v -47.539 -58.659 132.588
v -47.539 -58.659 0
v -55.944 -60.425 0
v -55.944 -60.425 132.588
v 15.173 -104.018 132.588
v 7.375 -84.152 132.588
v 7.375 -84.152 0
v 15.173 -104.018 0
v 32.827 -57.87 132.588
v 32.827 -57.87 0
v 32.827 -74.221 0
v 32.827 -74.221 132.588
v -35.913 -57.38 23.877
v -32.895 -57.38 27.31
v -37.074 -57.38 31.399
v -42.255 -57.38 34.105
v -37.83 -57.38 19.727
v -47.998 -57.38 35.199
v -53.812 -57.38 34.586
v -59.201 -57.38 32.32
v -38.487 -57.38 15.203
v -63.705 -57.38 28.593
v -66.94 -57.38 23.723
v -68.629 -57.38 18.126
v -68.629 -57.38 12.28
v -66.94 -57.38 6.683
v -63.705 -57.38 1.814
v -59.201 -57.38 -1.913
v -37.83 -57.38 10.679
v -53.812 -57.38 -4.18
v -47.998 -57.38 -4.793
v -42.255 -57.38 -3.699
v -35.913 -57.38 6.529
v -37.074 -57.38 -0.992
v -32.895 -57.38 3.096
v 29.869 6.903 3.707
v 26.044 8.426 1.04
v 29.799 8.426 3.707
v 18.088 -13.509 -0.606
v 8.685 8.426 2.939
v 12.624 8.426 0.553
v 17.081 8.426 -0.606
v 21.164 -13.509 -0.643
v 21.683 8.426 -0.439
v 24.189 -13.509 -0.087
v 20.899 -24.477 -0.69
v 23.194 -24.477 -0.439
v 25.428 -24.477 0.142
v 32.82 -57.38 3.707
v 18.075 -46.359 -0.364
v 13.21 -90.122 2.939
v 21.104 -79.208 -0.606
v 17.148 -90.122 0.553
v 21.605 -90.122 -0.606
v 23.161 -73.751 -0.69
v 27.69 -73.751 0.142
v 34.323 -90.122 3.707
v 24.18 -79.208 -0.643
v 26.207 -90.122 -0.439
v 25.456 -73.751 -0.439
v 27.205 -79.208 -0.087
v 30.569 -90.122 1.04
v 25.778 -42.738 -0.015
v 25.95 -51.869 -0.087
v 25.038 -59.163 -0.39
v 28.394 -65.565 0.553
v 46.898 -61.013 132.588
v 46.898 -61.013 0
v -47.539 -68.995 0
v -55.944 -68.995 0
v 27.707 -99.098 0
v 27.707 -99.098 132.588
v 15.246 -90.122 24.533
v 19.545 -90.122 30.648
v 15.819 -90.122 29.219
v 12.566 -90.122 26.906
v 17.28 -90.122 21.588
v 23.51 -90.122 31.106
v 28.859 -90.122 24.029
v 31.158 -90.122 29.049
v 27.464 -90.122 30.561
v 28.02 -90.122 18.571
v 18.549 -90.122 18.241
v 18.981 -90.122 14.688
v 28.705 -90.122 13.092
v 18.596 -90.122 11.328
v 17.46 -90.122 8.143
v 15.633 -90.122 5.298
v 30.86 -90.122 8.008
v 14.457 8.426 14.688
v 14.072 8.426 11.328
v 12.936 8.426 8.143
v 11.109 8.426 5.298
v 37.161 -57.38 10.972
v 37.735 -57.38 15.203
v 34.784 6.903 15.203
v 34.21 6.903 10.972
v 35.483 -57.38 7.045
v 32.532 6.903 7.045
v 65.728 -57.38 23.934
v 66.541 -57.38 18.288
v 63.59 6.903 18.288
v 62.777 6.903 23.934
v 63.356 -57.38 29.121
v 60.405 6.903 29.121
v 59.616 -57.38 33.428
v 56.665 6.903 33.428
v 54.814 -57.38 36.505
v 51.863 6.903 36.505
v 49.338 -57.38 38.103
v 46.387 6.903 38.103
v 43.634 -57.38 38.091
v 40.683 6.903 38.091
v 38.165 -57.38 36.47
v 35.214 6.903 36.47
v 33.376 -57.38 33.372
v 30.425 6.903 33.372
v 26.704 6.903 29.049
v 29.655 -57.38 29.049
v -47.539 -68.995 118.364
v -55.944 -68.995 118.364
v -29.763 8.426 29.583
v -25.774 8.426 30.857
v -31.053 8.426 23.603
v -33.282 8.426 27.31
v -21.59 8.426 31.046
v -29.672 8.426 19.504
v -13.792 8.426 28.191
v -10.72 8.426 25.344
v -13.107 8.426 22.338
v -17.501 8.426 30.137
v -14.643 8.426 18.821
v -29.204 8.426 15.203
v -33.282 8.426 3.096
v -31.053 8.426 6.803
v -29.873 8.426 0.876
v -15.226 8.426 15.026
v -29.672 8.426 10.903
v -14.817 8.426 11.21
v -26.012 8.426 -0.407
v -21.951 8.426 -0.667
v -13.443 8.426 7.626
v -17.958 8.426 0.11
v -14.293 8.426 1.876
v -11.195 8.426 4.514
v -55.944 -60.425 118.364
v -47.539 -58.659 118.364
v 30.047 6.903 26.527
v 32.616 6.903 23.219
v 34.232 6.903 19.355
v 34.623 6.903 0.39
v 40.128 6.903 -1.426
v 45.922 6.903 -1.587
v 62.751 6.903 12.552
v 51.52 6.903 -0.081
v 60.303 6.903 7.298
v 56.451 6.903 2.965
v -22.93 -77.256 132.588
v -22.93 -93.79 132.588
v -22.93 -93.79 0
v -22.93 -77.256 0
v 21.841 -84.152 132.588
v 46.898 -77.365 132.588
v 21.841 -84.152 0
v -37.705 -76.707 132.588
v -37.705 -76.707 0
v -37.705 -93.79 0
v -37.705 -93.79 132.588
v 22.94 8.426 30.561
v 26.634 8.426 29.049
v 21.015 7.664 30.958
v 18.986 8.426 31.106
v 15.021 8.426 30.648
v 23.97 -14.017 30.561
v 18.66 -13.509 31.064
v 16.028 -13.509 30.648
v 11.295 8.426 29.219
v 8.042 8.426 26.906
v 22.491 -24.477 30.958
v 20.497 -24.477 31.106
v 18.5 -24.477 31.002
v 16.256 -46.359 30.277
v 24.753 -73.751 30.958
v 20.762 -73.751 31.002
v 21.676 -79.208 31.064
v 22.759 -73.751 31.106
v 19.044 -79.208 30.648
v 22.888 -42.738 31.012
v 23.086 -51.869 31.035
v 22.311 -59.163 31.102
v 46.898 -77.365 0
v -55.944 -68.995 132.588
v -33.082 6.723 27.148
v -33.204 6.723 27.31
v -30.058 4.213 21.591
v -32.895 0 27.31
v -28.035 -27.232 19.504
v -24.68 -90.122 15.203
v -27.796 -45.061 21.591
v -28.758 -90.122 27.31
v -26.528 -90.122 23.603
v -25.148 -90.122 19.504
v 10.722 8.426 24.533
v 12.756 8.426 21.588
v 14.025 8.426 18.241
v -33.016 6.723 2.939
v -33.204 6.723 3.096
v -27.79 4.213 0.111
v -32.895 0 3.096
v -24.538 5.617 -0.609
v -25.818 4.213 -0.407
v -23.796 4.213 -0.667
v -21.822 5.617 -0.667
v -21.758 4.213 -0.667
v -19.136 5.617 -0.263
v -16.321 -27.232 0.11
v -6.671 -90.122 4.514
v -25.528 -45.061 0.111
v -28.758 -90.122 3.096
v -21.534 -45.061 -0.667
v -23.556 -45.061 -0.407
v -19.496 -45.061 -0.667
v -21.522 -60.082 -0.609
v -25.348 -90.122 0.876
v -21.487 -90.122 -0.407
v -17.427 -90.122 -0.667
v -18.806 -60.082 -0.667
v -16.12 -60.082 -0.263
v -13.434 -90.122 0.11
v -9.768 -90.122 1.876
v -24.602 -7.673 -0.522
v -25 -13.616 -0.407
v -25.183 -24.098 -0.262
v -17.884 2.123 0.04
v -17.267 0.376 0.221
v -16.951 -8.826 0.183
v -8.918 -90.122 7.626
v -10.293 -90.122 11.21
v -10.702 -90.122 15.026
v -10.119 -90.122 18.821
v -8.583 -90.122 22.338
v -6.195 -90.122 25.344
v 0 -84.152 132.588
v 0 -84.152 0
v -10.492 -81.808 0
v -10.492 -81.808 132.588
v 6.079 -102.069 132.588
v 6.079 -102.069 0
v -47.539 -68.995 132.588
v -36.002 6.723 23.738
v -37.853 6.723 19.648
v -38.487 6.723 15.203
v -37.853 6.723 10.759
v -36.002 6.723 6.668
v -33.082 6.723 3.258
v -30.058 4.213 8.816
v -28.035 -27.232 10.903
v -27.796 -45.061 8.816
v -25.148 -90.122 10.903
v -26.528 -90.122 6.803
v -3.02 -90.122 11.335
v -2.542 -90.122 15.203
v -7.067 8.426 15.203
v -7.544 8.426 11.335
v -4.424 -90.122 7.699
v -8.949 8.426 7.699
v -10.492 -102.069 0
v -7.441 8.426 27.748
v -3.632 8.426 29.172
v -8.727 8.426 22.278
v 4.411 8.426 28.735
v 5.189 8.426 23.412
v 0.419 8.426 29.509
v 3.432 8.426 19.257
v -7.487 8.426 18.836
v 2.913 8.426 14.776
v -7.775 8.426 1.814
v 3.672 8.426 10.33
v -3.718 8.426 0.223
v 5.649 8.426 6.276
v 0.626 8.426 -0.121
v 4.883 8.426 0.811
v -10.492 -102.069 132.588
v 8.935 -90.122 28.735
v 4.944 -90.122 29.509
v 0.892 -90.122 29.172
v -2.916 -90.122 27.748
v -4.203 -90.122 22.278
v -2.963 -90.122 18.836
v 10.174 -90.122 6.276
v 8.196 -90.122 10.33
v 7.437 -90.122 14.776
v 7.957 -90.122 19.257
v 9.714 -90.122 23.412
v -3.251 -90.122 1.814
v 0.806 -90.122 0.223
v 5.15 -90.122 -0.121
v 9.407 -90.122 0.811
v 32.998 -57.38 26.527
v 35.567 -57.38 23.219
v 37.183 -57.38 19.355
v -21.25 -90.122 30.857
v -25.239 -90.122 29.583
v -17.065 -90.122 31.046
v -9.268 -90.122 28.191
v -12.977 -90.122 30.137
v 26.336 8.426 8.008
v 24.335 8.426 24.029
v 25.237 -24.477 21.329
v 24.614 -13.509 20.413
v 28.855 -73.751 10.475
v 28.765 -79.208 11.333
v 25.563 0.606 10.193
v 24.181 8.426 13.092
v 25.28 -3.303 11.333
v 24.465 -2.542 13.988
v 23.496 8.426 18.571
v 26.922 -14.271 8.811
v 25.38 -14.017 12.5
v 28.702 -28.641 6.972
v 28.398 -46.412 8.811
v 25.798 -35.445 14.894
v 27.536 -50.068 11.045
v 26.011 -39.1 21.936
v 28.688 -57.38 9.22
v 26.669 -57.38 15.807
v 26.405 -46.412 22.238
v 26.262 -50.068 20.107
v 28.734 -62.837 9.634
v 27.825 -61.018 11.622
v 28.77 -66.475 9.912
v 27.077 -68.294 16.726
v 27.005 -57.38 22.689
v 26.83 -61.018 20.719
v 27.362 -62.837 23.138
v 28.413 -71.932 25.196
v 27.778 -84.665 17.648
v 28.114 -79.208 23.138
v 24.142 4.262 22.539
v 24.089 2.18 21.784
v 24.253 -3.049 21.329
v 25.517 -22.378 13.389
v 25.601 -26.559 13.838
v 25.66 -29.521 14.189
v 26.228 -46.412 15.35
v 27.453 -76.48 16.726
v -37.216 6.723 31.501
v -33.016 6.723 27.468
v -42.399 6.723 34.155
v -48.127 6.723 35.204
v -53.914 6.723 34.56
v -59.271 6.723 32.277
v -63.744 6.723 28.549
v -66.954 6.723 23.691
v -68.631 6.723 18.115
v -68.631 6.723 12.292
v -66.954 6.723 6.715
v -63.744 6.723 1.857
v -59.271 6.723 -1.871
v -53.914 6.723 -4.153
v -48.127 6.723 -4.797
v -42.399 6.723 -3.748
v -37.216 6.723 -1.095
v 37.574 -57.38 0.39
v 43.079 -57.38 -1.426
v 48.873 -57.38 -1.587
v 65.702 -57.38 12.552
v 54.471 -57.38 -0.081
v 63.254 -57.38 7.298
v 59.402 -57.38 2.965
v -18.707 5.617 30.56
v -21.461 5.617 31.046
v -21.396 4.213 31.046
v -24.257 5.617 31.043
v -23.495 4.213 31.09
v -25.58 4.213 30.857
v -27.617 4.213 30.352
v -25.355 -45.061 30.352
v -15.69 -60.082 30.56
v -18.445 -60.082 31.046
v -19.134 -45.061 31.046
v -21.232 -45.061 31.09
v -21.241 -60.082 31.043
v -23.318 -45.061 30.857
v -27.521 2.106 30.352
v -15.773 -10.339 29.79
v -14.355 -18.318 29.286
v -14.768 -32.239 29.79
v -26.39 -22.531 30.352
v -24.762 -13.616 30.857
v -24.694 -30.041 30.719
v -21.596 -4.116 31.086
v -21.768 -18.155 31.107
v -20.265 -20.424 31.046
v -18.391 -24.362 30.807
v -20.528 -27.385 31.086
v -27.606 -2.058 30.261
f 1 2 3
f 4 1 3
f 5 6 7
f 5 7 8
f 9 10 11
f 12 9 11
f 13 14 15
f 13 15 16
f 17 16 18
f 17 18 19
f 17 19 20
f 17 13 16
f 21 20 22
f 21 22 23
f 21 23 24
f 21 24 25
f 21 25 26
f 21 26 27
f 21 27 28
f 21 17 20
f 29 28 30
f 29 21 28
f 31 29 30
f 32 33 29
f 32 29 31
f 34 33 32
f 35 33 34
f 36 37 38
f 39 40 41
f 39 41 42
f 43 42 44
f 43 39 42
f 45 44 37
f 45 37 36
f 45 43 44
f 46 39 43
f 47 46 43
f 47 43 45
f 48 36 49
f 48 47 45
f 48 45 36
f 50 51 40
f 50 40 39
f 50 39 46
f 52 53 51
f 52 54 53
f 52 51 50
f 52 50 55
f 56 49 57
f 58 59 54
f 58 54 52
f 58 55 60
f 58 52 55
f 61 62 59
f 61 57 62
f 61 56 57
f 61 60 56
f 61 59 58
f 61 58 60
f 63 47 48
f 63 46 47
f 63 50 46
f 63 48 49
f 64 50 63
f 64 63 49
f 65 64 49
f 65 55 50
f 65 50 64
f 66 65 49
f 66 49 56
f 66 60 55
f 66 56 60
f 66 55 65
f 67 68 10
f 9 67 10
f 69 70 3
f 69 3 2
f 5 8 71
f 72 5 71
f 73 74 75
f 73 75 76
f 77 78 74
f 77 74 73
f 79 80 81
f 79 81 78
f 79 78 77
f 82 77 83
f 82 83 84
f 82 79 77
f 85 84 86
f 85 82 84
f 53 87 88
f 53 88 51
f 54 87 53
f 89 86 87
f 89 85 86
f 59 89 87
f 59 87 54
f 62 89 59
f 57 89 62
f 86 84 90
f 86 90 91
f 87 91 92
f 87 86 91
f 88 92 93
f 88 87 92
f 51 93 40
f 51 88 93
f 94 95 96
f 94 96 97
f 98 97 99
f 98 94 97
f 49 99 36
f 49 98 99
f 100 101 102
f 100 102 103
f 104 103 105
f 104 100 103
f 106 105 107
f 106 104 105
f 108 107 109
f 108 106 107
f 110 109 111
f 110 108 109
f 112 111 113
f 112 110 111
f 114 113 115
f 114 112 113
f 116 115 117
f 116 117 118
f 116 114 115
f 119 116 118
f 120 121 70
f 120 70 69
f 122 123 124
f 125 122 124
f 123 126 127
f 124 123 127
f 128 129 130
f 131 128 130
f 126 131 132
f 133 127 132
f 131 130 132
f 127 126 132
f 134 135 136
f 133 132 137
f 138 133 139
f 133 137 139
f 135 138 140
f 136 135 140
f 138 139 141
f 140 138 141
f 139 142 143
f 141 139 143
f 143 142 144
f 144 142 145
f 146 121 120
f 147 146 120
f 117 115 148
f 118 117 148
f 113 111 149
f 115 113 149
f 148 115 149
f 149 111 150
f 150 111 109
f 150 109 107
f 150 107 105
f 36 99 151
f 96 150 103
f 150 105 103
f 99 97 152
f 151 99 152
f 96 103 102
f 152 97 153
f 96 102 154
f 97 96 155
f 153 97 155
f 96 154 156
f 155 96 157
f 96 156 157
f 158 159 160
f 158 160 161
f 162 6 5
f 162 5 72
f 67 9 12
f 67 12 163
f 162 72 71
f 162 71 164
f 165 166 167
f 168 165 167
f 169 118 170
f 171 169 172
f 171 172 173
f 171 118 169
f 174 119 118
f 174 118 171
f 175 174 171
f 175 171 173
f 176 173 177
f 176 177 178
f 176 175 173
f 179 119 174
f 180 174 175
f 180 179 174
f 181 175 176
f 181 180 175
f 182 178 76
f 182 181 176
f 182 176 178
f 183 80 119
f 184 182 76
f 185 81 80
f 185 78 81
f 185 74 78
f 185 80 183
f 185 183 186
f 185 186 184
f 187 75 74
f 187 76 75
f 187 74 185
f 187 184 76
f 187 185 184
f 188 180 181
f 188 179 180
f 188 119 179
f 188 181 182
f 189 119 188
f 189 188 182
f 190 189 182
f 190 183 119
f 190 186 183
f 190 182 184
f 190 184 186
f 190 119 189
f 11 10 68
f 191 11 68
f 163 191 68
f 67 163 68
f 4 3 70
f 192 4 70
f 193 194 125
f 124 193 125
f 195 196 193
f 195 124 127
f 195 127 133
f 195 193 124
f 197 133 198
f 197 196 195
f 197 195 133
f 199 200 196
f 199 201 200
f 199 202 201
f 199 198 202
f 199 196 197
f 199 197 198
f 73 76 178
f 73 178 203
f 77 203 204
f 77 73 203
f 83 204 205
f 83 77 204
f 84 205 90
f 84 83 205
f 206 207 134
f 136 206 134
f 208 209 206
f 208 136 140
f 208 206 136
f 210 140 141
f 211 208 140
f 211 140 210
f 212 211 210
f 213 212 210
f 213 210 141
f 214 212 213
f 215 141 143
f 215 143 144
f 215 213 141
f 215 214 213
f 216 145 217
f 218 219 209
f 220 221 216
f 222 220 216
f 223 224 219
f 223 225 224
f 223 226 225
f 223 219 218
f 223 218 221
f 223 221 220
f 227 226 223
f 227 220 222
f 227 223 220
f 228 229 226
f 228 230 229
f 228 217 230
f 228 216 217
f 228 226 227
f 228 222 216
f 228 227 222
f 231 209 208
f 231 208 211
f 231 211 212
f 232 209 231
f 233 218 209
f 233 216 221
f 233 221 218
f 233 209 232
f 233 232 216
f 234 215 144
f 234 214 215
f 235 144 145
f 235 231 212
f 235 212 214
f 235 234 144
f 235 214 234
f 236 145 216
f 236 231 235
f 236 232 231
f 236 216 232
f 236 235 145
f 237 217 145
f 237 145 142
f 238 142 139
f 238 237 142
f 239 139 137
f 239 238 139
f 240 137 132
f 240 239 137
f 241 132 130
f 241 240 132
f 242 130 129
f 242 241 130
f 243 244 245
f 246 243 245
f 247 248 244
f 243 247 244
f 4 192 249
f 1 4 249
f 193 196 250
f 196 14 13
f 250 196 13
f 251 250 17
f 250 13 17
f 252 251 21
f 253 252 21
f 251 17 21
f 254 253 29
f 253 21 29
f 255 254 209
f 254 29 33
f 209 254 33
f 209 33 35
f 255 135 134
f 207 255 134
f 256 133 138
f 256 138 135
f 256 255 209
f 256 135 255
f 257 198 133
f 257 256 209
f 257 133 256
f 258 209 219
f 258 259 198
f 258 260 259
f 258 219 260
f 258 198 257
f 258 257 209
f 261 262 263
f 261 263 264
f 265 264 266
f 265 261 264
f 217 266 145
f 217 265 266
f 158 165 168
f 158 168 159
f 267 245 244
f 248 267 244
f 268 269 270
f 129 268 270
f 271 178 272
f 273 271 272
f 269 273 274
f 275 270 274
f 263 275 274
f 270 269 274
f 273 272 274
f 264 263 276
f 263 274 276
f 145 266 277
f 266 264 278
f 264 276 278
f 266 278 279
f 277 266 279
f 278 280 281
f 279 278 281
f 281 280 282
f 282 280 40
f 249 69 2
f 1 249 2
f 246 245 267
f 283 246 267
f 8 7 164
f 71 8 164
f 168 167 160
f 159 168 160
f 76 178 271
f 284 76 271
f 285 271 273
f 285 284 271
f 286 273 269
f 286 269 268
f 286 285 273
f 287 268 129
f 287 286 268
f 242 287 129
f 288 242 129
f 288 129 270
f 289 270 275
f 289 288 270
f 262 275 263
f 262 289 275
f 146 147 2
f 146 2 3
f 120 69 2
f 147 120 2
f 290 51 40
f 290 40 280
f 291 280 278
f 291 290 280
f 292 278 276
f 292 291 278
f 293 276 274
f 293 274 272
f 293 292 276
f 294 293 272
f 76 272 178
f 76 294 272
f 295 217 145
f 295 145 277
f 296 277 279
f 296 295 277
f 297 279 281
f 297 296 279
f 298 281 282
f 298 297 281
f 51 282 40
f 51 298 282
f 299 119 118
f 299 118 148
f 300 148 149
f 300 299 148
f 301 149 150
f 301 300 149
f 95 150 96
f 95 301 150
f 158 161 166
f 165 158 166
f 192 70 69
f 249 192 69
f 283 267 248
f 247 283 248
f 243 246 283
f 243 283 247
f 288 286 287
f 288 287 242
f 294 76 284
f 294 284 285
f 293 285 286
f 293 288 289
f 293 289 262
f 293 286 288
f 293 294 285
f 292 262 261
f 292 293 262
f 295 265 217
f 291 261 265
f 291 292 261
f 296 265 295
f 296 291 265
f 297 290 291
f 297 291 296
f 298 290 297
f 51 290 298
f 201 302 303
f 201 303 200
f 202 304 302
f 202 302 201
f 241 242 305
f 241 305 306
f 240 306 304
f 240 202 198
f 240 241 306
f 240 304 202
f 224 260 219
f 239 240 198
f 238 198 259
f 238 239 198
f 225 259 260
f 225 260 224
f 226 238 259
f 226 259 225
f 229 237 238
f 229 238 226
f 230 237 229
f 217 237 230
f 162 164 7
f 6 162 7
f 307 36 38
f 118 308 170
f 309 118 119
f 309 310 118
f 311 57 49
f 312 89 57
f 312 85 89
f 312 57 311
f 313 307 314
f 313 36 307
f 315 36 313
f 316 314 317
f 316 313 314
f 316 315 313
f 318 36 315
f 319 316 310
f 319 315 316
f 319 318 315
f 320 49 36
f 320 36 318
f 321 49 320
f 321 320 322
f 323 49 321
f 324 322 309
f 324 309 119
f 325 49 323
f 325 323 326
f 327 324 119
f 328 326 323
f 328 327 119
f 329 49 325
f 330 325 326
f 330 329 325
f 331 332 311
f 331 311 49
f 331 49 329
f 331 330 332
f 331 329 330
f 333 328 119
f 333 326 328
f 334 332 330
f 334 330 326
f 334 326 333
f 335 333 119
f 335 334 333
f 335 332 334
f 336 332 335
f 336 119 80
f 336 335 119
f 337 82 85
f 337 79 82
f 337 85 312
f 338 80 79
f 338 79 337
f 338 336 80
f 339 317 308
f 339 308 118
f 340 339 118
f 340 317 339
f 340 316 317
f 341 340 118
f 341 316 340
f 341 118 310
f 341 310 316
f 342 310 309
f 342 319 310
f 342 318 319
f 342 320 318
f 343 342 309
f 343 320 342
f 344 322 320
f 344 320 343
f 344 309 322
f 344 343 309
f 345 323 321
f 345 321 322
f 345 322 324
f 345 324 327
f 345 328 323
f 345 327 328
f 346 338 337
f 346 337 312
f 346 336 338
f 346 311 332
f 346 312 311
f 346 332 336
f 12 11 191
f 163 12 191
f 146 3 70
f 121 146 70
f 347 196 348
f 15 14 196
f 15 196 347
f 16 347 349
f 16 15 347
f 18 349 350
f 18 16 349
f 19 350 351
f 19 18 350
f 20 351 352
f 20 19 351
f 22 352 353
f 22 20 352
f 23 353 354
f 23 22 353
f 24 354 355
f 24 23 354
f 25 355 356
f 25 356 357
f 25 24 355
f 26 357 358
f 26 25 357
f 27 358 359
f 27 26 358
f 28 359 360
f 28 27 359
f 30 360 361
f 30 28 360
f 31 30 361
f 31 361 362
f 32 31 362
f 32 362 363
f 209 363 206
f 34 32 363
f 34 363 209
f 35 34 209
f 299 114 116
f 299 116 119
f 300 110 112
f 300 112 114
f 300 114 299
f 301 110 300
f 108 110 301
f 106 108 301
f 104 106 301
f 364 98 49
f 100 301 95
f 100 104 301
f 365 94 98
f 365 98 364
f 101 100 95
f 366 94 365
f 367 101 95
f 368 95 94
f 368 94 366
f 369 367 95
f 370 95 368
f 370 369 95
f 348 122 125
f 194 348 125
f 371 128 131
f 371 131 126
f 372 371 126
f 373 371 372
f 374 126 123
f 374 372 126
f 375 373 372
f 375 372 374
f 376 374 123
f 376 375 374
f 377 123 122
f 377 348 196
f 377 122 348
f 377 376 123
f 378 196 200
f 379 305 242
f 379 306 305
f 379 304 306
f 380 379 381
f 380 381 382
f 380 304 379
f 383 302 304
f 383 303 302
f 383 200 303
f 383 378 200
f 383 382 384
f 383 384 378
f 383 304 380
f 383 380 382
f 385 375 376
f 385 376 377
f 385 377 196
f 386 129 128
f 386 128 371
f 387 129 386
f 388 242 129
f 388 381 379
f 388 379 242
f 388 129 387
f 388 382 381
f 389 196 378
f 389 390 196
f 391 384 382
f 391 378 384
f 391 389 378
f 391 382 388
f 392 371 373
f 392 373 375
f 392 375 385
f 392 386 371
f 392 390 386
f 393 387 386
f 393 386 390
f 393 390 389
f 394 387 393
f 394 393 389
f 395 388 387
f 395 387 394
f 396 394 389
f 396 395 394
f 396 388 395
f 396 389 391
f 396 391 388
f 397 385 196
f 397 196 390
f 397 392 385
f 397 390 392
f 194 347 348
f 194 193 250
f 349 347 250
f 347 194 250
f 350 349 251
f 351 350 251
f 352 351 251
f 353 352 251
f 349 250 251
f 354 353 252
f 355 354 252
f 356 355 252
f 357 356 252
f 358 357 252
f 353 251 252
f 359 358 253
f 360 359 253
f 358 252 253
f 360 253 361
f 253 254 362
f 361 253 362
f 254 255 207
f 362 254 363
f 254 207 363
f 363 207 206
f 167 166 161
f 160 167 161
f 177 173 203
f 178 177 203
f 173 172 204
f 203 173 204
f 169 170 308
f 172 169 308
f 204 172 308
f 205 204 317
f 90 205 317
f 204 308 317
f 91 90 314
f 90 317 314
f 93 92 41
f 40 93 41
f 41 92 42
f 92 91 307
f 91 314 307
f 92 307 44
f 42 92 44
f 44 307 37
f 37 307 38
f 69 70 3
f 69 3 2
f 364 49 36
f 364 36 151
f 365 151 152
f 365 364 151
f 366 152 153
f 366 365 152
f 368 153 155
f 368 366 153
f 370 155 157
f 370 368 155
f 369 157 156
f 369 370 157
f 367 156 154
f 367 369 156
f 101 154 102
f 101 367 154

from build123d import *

# Parameters (mm, degrees)
F6_DEPTH = 118.364
F7_DEPTH = 132.588


with BuildPart() as f2:
    # F2: sweep along a path in F1
    with BuildLine(Plane.XY) as f2_path:
        Line((-44.0169908106, 6.7233908921), (-44.0169908106, -57.3797412217))
    # F0 (on Front) → F2 (sweep)
    with BuildSketch(Plane.XZ):
        with BuildLine():
            ThreePointArc((-32.8950643292, 3.0960998597), (-38.4865410432, 15.2031891048), (-32.8950643292, 27.3102783499))
            ThreePointArc((-32.8950643292, 27.3102783499), (-68.8436324224, 15.2031891048), (-32.8950643292, 3.0960998597))
        make_face()
    sweep(path=f2_path.line)

    # F3: sweep along a path in F1
    with BuildLine(Plane.XY) as f3_path:
        Line((-30.7416990399, 8.4258504212), (-26.2174941599, -90.1224240661))
    # F0 (on Front) → F3 (sweep)
    with BuildSketch(Plane.XZ):
        with BuildLine():
            ThreePointArc((-10.8082092625, 4.5136918076), (-14.839667369, 15.0264768841), (-10.3328398225, 25.3444132084))
            ThreePointArc((-10.3328398225, 25.3444132084), (-21.2027686929, 31.0464954324), (-32.8950643292, 27.3102783499))
            ThreePointArc((-32.8950643292, 27.3102783499), (-29.8642864569, 21.590831794), (-28.8175275103, 15.2031891048))
            ThreePointArc((-28.8175275103, 15.2031891048), (-29.8642864569, 8.8155464156), (-32.8950643292, 3.0960998597))
            ThreePointArc((-32.8950643292, 3.0960998597), (-21.5645875614, -0.6674876665), (-10.8082092625, 4.5136918076))
        make_face()
        with BuildLine():
            ThreePointArc((9.0722310211, 2.939421188), (3.2996434316, 14.7764078694), (8.4288314725, 26.9060596045))
            ThreePointArc((8.4288314725, 26.9060596045), (-1.2312582246, 29.480203767), (-10.3328398225, 25.3444132084))
            ThreePointArc((-10.3328398225, 25.3444132084), (-7.6209621654, 20.5927290744), (-6.6798769131, 15.2031891048))
            ThreePointArc((-6.6798769131, 15.2031891048), (-7.7478171513, 9.4736934801), (-10.8082092625, 4.5136918076))
            ThreePointArc((-10.8082092625, 4.5136918076), (-1.1717453263, -0.1093831623), (9.0722310211, 2.939421188))
        make_face()
        with BuildLine():
            ThreePointArc((8.4288314725, 26.9060596045), (13.1423748313, 21.5877105703), (14.8435309635, 14.687826857))
            ThreePointArc((14.8435309635, 14.687826857), (13.32280664, 8.1431164205), (9.0722310211, 2.939421188))
            ThreePointArc((9.0722310211, 2.939421188), (19.7748741488, -0.6896494936), (30.185829373, 3.7067962586))
            ThreePointArc((30.185829373, 3.7067962586), (24.0352744748, 15.8074690973), (27.0205055983, 29.0492213924))
            ThreePointArc((27.0205055983, 29.0492213924), (17.3760462138, 31.001897758), (8.4288314725, 26.9060596045))
        make_face()
    sweep(path=f3_path.line)

    # F4: sweep along a path in F1
    with BuildLine(Plane.XY) as f4_path:
        Line((32.6707735658, 6.9026499987), (35.6218826498, -57.3797412217))
    # F0 (on Front) → F4 (sweep)
    with BuildSketch(Plane.XZ):
        with BuildLine():
            ThreePointArc((63.9070751592, 18.2878697524), (49.4990064529, 37.5000124172), (27.0205055983, 29.0492213924))
            ThreePointArc((27.0205055983, 29.0492213924), (32.9328191777, 23.2188021856), (35.1005799875, 15.2031891048))
            ThreePointArc((35.1005799875, 15.2031891048), (33.8203637071, 8.9517528283), (30.185829373, 3.7067962586))
            ThreePointArc((30.185829373, 3.7067962586), (51.8369276005, -0.0814669368), (63.9070751592, 18.2878697524))
        make_face()
    sweep(path=f4_path.line)


with BuildPart() as f6:
    # F5 (on Top) → F6 (new body)
    with BuildSketch(Plane.XY):
        Polygon((-47.5386753678, -58.658786118), (-55.944185704, -60.4253858328), (-55.944185704, -68.9952373505), (-47.5386753678, -68.9952373505), align=None)
    extrude(amount=F6_DEPTH)


with BuildPart() as f7:
    # F5 (on Top) → F7 (new body)
    with BuildSketch(Plane.XY):
        Polygon((-47.5386753678, -58.658786118), (-55.944185704, -60.4253858328), (-55.944185704, -68.9952373505), (-47.5386753678, -68.9952373505), align=None)
    extrude(amount=F7_DEPTH)


with BuildPart() as f7b:
    # F5 (on Top) → F7, piece 2 (new body)
    with BuildSketch(Plane.XY):
        Polygon((-22.9295529425, -77.2556439042), (-37.7050116658, -76.7068341374), (-37.7050116658, -93.7900543213), (-22.9295529425, -93.7900543213), align=None)
    extrude(amount=F7_DEPTH)


with BuildPart() as f7c:
    # F5 (on Top) → F7, piece 3 (new body)
    with BuildSketch(Plane.XY):
        Polygon((0, -84.1523632407), (-10.4915397242, -81.8082764745), (-10.4915397242, -102.0687669516), (6.0791820288, -102.0687669516), align=None)
    extrude(amount=F7_DEPTH)


with BuildPart() as f7d:
    # F5 (on Top) → F7, piece 4 (new body)
    with BuildSketch(Plane.XY):
        Polygon((21.8410599335, -84.1523632407), (7.3752552271, -84.1523632407), (15.1729341596, -104.0177494287), (27.707461557, -99.0976225663), align=None)
    extrude(amount=F7_DEPTH)


with BuildPart() as f7e:
    # F5 (on Top) → F7, piece 5 (new body)
    with BuildSketch(Plane.XY):
        Polygon((46.8978509307, -77.3646011949), (46.8978509307, -61.0133817398), (32.8267207991, -57.8695200384), (32.8267207991, -74.2207394935), align=None)
    extrude(amount=F7_DEPTH)


solid = Compound([f2.part, f6.part, f7.part, f7b.part, f7c.part, f7d.part, f7e.part])
